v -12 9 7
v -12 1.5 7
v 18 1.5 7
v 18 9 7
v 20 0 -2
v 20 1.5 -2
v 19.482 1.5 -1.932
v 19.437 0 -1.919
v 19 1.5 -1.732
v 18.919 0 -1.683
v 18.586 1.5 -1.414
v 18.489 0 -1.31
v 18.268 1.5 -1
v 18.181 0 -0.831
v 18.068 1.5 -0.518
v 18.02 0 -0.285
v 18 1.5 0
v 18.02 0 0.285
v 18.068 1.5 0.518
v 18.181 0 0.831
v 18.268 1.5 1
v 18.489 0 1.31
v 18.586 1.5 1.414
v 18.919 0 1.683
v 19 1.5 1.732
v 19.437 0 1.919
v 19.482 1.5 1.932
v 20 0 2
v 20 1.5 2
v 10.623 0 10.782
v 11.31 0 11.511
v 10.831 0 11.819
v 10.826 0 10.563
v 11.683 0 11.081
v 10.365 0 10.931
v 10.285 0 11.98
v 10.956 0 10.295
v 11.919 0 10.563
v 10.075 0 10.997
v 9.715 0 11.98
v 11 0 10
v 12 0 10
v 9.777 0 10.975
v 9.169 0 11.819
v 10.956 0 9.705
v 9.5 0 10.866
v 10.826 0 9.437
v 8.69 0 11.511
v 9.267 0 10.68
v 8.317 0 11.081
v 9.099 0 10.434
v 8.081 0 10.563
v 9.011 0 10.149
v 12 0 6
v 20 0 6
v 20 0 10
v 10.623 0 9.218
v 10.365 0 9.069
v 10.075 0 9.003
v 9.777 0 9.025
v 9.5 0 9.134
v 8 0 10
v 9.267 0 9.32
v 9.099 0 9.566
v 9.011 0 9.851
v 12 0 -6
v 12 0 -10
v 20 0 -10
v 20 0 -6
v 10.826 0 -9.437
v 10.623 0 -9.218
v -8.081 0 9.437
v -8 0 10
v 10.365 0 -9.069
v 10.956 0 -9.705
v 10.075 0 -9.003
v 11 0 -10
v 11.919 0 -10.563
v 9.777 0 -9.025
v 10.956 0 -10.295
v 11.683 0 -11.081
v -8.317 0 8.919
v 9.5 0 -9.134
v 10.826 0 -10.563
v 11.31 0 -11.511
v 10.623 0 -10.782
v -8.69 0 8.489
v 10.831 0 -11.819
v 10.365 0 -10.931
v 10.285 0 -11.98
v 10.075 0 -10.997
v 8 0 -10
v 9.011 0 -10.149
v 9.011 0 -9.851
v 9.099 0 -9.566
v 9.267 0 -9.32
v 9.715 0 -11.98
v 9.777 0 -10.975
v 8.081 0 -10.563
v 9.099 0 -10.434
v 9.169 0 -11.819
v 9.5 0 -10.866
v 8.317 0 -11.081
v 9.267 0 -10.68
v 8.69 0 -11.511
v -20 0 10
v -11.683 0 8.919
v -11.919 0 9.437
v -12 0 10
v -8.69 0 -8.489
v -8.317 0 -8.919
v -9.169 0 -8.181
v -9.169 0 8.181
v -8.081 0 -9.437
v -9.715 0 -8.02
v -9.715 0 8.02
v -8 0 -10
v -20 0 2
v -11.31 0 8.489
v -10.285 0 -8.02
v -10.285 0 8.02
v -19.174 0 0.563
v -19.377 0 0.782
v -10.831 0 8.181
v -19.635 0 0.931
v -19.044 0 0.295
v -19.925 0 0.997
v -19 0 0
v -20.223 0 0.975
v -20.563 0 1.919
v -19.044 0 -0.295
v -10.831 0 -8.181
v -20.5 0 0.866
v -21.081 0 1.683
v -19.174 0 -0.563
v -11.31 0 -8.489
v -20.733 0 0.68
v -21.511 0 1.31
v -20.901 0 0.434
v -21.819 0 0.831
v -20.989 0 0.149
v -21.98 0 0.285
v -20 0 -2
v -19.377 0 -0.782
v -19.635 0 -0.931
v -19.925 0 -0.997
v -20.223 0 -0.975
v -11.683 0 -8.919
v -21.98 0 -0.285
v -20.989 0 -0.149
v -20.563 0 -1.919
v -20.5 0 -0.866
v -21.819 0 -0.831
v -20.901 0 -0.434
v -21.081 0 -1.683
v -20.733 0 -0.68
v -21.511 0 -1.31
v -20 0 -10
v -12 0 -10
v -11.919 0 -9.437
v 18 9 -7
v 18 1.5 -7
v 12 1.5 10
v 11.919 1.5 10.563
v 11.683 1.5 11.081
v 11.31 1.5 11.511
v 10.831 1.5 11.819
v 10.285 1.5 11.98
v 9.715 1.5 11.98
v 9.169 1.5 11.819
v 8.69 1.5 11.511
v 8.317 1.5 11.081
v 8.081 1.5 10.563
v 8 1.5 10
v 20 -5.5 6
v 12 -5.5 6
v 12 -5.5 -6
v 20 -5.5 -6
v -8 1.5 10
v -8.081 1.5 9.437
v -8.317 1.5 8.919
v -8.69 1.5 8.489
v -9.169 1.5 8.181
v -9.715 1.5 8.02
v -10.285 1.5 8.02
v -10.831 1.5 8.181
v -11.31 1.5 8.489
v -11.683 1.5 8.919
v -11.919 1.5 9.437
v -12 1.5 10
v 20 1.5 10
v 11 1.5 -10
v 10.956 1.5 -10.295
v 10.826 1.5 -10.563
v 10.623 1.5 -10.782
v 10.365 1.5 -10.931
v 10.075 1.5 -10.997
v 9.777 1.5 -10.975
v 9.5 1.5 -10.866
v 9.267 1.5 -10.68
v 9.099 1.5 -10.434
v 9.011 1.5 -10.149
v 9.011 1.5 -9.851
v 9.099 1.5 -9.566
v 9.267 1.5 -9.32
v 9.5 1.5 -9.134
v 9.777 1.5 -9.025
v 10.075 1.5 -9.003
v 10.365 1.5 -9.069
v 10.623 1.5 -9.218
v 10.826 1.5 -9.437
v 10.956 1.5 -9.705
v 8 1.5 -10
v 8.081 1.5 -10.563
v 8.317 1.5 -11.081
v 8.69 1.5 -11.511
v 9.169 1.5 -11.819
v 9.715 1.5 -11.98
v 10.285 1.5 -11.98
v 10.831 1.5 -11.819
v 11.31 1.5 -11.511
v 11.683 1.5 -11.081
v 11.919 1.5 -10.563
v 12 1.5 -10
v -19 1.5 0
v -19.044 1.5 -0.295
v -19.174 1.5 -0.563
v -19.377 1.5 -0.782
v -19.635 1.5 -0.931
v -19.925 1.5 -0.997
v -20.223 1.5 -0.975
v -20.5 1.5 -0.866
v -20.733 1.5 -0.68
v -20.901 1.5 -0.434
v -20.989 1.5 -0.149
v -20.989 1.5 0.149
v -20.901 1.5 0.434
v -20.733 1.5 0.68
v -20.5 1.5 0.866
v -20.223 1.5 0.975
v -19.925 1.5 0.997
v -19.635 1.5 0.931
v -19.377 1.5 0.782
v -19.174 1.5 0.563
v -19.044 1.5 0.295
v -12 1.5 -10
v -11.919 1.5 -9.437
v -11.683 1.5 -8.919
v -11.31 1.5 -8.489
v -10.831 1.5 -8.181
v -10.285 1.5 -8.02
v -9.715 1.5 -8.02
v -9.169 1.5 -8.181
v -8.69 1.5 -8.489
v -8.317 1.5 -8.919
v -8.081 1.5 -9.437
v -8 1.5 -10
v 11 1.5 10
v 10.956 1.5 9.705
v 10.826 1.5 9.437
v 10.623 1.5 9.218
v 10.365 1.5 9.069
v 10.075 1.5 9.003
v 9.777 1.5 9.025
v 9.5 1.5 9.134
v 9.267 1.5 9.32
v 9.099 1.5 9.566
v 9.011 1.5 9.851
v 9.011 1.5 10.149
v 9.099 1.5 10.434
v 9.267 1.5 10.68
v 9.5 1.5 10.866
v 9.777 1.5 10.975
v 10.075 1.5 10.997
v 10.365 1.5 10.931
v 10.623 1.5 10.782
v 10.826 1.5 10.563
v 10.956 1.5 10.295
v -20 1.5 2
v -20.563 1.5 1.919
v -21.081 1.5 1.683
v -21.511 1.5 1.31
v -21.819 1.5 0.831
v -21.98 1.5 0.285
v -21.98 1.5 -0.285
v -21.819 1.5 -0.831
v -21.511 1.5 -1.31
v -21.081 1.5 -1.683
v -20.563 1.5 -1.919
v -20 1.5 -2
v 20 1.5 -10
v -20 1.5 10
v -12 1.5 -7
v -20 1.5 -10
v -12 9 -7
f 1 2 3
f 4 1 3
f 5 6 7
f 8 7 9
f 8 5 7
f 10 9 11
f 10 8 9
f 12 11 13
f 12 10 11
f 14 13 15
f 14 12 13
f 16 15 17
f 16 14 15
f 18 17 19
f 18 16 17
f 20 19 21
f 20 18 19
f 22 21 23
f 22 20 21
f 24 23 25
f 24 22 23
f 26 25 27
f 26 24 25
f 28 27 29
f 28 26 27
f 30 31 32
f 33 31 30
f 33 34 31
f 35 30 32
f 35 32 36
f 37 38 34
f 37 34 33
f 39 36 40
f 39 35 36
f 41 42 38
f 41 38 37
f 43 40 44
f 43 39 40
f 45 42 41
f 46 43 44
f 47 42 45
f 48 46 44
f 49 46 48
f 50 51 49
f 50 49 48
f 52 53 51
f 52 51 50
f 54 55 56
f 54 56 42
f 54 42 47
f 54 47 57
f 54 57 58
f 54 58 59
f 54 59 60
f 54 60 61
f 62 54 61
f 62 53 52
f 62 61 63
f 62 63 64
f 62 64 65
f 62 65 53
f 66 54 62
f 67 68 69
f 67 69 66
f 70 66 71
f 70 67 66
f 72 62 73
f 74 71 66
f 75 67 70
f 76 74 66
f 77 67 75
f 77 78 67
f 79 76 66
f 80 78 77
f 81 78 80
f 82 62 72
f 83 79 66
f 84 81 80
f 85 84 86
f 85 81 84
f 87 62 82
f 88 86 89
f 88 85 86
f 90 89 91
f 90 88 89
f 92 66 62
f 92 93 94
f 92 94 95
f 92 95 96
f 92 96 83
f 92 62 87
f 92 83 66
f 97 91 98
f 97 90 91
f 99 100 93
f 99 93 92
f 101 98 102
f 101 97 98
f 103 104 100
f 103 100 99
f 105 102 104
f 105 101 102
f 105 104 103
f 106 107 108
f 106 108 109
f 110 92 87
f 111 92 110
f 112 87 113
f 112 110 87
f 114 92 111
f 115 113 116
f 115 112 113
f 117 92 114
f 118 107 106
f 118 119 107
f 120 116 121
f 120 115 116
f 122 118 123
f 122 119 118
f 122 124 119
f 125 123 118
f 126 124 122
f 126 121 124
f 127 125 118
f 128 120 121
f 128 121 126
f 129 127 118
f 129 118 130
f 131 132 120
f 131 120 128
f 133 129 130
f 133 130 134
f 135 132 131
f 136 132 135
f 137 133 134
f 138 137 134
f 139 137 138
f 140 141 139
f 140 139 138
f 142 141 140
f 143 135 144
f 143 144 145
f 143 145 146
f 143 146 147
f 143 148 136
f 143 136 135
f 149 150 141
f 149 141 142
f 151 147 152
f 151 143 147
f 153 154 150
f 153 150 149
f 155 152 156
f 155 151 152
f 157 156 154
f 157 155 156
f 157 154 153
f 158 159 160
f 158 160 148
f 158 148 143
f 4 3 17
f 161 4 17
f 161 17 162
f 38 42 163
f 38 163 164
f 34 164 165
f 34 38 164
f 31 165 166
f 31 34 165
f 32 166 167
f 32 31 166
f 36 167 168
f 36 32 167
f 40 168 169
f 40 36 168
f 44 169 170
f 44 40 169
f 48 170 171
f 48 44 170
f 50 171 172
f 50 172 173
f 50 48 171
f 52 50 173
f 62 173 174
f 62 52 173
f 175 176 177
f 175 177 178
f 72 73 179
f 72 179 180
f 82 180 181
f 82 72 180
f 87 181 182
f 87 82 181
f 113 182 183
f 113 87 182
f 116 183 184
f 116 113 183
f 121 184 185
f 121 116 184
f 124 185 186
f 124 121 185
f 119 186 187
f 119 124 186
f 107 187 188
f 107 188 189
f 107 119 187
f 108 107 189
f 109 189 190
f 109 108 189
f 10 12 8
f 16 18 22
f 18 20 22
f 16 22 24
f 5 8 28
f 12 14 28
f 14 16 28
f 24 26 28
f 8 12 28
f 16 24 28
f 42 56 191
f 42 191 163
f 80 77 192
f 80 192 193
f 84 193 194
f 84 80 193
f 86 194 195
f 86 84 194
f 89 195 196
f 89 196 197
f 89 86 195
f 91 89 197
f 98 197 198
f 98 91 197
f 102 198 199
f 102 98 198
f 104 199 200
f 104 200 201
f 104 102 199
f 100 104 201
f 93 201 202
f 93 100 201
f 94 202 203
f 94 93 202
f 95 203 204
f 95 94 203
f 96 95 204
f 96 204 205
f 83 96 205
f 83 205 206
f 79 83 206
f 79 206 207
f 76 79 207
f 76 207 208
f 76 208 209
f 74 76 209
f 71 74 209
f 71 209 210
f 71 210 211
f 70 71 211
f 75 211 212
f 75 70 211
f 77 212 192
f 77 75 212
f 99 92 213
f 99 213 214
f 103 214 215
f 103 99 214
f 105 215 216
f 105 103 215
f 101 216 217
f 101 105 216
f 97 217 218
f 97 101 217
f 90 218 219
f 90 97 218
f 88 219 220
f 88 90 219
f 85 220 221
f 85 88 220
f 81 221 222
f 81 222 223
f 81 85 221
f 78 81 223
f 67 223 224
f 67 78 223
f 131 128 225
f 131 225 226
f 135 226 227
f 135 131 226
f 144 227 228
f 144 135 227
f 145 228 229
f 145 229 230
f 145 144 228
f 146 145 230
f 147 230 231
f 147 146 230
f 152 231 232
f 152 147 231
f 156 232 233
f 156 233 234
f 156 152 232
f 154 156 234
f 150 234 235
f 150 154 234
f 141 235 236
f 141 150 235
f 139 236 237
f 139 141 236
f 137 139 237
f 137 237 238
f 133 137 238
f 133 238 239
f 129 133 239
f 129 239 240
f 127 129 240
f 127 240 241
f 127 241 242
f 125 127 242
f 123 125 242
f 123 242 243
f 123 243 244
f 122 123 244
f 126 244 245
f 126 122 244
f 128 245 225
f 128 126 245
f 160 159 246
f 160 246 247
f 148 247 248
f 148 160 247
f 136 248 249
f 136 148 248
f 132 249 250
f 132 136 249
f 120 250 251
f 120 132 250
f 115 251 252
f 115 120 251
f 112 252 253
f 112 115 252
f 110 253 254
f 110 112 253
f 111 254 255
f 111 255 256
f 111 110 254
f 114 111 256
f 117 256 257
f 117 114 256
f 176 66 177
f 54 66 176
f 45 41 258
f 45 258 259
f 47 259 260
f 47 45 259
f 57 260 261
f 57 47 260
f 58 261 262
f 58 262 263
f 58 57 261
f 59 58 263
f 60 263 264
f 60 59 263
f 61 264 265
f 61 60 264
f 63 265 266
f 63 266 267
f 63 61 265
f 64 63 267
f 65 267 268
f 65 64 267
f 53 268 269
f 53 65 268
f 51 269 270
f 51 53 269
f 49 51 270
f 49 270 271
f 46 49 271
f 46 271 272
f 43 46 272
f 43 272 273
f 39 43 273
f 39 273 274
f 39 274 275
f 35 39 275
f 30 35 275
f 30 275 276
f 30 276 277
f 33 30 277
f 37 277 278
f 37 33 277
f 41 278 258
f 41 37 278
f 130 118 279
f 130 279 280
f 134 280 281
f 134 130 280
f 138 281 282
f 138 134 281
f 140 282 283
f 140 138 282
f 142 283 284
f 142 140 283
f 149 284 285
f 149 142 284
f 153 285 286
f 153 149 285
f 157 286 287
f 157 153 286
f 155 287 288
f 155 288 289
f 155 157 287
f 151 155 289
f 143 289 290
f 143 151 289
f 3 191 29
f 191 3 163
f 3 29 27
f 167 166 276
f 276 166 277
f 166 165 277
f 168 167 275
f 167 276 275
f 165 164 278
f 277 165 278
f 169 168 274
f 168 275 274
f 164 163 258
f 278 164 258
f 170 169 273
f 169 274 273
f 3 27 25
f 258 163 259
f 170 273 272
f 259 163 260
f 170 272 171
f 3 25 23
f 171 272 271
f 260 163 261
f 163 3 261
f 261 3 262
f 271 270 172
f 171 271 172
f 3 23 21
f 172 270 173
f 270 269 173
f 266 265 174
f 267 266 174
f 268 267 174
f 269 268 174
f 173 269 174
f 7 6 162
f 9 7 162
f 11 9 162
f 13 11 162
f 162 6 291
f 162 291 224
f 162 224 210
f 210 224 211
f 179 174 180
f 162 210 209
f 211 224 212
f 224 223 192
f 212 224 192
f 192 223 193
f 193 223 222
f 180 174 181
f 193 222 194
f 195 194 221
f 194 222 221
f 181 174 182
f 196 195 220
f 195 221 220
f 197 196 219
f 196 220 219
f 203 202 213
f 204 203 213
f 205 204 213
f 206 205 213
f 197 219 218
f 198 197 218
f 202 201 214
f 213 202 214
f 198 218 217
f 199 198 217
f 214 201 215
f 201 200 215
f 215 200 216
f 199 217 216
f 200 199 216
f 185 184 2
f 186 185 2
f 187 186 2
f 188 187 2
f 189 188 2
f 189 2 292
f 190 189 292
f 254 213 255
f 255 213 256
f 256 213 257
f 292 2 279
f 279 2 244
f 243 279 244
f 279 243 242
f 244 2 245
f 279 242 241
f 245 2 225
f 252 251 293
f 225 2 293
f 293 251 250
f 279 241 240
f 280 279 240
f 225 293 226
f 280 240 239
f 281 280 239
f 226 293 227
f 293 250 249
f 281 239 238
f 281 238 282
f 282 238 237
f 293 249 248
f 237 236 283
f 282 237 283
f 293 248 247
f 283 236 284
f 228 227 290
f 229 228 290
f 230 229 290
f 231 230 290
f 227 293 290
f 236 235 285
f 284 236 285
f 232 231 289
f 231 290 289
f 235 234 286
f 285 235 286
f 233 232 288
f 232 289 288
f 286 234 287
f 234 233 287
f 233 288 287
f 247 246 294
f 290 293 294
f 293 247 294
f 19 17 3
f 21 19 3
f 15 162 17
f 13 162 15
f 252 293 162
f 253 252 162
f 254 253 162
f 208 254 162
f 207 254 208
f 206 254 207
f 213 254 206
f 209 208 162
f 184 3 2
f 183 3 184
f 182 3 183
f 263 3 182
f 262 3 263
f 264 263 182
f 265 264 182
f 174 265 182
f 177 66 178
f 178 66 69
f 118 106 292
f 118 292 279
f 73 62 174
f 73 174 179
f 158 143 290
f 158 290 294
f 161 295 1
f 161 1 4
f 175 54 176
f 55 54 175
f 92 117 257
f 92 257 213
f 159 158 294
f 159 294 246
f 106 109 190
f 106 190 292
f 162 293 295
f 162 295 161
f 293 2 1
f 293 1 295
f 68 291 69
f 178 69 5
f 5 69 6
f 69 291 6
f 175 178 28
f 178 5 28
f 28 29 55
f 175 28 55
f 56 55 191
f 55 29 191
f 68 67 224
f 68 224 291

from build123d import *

# Parameters (mm, degrees)
SKETCH_1_R      = 1
EXTRUDE_1_DEPTH = 1.5
SKETCH_2_W      = 30
SKETCH_2_H      = 14
EXTRUDE_2_DEPTH = 7.5
SKETCH_3_W      = 8
SKETCH_3_H      = 12
EXTRUDE_3_DEPTH = 5.5


with BuildPart() as part:
    # Эскиз1 → Бобышка-Вытянуть1 (new body)
    with BuildSketch(Plane(origin=(0, 0, 0), x_dir=(1, 0, 0), z_dir=(0, 1, 0))):
        with BuildLine():
            Line((-20, 10), (-12, 10))
            ThreePointArc((-12, 10), (-10, 8), (-8, 10))
            Line((-8, 10), (8, 10))
            ThreePointArc((8, 10), (10, 12), (12, 10))
            Line((12, 10), (20, 10))
            Line((20, 10), (20, 2))
            ThreePointArc((20, 2), (18, 0), (20, -2))
            Line((20, -2), (20, -10))
            Line((20, -10), (12, -10))
            ThreePointArc((12, -10), (10, -12), (8, -10))
            Line((8, -10), (-8, -10))
            ThreePointArc((-8, -10), (-10, -8), (-12, -10))
            Line((-12, -10), (-20, -10))
            Line((-20, -10), (-20, -2))
            ThreePointArc((-20, -2), (-22, 0), (-20, 2))
            Line((-20, 2), (-20, 10))
        make_face()
        with Locations((-20, 0)):
            Circle(SKETCH_1_R, mode=Mode.SUBTRACT)
        with Locations((10, 10)):
            Circle(SKETCH_1_R, mode=Mode.SUBTRACT)
        with Locations((10, -10)):
            Circle(SKETCH_1_R, mode=Mode.SUBTRACT)
    extrude(amount=EXTRUDE_1_DEPTH)

    # Эскиз2 → Бобышка-Вытянуть2 (add)
    with BuildSketch(Plane(origin=(0, 1.5, 0), x_dir=(1, 0, 0), z_dir=(0, 1, 0))):
        with Locations((3, 0)):
            Rectangle(SKETCH_2_W, SKETCH_2_H)
    extrude(amount=EXTRUDE_2_DEPTH)

    # Эскиз3 → Бобышка-Вытянуть3 (add)
    with BuildSketch(Plane.XZ):
        with Locations((16, 0)):
            Rectangle(SKETCH_3_W, SKETCH_3_H)
    extrude(amount=EXTRUDE_3_DEPTH)


solid = part.part
